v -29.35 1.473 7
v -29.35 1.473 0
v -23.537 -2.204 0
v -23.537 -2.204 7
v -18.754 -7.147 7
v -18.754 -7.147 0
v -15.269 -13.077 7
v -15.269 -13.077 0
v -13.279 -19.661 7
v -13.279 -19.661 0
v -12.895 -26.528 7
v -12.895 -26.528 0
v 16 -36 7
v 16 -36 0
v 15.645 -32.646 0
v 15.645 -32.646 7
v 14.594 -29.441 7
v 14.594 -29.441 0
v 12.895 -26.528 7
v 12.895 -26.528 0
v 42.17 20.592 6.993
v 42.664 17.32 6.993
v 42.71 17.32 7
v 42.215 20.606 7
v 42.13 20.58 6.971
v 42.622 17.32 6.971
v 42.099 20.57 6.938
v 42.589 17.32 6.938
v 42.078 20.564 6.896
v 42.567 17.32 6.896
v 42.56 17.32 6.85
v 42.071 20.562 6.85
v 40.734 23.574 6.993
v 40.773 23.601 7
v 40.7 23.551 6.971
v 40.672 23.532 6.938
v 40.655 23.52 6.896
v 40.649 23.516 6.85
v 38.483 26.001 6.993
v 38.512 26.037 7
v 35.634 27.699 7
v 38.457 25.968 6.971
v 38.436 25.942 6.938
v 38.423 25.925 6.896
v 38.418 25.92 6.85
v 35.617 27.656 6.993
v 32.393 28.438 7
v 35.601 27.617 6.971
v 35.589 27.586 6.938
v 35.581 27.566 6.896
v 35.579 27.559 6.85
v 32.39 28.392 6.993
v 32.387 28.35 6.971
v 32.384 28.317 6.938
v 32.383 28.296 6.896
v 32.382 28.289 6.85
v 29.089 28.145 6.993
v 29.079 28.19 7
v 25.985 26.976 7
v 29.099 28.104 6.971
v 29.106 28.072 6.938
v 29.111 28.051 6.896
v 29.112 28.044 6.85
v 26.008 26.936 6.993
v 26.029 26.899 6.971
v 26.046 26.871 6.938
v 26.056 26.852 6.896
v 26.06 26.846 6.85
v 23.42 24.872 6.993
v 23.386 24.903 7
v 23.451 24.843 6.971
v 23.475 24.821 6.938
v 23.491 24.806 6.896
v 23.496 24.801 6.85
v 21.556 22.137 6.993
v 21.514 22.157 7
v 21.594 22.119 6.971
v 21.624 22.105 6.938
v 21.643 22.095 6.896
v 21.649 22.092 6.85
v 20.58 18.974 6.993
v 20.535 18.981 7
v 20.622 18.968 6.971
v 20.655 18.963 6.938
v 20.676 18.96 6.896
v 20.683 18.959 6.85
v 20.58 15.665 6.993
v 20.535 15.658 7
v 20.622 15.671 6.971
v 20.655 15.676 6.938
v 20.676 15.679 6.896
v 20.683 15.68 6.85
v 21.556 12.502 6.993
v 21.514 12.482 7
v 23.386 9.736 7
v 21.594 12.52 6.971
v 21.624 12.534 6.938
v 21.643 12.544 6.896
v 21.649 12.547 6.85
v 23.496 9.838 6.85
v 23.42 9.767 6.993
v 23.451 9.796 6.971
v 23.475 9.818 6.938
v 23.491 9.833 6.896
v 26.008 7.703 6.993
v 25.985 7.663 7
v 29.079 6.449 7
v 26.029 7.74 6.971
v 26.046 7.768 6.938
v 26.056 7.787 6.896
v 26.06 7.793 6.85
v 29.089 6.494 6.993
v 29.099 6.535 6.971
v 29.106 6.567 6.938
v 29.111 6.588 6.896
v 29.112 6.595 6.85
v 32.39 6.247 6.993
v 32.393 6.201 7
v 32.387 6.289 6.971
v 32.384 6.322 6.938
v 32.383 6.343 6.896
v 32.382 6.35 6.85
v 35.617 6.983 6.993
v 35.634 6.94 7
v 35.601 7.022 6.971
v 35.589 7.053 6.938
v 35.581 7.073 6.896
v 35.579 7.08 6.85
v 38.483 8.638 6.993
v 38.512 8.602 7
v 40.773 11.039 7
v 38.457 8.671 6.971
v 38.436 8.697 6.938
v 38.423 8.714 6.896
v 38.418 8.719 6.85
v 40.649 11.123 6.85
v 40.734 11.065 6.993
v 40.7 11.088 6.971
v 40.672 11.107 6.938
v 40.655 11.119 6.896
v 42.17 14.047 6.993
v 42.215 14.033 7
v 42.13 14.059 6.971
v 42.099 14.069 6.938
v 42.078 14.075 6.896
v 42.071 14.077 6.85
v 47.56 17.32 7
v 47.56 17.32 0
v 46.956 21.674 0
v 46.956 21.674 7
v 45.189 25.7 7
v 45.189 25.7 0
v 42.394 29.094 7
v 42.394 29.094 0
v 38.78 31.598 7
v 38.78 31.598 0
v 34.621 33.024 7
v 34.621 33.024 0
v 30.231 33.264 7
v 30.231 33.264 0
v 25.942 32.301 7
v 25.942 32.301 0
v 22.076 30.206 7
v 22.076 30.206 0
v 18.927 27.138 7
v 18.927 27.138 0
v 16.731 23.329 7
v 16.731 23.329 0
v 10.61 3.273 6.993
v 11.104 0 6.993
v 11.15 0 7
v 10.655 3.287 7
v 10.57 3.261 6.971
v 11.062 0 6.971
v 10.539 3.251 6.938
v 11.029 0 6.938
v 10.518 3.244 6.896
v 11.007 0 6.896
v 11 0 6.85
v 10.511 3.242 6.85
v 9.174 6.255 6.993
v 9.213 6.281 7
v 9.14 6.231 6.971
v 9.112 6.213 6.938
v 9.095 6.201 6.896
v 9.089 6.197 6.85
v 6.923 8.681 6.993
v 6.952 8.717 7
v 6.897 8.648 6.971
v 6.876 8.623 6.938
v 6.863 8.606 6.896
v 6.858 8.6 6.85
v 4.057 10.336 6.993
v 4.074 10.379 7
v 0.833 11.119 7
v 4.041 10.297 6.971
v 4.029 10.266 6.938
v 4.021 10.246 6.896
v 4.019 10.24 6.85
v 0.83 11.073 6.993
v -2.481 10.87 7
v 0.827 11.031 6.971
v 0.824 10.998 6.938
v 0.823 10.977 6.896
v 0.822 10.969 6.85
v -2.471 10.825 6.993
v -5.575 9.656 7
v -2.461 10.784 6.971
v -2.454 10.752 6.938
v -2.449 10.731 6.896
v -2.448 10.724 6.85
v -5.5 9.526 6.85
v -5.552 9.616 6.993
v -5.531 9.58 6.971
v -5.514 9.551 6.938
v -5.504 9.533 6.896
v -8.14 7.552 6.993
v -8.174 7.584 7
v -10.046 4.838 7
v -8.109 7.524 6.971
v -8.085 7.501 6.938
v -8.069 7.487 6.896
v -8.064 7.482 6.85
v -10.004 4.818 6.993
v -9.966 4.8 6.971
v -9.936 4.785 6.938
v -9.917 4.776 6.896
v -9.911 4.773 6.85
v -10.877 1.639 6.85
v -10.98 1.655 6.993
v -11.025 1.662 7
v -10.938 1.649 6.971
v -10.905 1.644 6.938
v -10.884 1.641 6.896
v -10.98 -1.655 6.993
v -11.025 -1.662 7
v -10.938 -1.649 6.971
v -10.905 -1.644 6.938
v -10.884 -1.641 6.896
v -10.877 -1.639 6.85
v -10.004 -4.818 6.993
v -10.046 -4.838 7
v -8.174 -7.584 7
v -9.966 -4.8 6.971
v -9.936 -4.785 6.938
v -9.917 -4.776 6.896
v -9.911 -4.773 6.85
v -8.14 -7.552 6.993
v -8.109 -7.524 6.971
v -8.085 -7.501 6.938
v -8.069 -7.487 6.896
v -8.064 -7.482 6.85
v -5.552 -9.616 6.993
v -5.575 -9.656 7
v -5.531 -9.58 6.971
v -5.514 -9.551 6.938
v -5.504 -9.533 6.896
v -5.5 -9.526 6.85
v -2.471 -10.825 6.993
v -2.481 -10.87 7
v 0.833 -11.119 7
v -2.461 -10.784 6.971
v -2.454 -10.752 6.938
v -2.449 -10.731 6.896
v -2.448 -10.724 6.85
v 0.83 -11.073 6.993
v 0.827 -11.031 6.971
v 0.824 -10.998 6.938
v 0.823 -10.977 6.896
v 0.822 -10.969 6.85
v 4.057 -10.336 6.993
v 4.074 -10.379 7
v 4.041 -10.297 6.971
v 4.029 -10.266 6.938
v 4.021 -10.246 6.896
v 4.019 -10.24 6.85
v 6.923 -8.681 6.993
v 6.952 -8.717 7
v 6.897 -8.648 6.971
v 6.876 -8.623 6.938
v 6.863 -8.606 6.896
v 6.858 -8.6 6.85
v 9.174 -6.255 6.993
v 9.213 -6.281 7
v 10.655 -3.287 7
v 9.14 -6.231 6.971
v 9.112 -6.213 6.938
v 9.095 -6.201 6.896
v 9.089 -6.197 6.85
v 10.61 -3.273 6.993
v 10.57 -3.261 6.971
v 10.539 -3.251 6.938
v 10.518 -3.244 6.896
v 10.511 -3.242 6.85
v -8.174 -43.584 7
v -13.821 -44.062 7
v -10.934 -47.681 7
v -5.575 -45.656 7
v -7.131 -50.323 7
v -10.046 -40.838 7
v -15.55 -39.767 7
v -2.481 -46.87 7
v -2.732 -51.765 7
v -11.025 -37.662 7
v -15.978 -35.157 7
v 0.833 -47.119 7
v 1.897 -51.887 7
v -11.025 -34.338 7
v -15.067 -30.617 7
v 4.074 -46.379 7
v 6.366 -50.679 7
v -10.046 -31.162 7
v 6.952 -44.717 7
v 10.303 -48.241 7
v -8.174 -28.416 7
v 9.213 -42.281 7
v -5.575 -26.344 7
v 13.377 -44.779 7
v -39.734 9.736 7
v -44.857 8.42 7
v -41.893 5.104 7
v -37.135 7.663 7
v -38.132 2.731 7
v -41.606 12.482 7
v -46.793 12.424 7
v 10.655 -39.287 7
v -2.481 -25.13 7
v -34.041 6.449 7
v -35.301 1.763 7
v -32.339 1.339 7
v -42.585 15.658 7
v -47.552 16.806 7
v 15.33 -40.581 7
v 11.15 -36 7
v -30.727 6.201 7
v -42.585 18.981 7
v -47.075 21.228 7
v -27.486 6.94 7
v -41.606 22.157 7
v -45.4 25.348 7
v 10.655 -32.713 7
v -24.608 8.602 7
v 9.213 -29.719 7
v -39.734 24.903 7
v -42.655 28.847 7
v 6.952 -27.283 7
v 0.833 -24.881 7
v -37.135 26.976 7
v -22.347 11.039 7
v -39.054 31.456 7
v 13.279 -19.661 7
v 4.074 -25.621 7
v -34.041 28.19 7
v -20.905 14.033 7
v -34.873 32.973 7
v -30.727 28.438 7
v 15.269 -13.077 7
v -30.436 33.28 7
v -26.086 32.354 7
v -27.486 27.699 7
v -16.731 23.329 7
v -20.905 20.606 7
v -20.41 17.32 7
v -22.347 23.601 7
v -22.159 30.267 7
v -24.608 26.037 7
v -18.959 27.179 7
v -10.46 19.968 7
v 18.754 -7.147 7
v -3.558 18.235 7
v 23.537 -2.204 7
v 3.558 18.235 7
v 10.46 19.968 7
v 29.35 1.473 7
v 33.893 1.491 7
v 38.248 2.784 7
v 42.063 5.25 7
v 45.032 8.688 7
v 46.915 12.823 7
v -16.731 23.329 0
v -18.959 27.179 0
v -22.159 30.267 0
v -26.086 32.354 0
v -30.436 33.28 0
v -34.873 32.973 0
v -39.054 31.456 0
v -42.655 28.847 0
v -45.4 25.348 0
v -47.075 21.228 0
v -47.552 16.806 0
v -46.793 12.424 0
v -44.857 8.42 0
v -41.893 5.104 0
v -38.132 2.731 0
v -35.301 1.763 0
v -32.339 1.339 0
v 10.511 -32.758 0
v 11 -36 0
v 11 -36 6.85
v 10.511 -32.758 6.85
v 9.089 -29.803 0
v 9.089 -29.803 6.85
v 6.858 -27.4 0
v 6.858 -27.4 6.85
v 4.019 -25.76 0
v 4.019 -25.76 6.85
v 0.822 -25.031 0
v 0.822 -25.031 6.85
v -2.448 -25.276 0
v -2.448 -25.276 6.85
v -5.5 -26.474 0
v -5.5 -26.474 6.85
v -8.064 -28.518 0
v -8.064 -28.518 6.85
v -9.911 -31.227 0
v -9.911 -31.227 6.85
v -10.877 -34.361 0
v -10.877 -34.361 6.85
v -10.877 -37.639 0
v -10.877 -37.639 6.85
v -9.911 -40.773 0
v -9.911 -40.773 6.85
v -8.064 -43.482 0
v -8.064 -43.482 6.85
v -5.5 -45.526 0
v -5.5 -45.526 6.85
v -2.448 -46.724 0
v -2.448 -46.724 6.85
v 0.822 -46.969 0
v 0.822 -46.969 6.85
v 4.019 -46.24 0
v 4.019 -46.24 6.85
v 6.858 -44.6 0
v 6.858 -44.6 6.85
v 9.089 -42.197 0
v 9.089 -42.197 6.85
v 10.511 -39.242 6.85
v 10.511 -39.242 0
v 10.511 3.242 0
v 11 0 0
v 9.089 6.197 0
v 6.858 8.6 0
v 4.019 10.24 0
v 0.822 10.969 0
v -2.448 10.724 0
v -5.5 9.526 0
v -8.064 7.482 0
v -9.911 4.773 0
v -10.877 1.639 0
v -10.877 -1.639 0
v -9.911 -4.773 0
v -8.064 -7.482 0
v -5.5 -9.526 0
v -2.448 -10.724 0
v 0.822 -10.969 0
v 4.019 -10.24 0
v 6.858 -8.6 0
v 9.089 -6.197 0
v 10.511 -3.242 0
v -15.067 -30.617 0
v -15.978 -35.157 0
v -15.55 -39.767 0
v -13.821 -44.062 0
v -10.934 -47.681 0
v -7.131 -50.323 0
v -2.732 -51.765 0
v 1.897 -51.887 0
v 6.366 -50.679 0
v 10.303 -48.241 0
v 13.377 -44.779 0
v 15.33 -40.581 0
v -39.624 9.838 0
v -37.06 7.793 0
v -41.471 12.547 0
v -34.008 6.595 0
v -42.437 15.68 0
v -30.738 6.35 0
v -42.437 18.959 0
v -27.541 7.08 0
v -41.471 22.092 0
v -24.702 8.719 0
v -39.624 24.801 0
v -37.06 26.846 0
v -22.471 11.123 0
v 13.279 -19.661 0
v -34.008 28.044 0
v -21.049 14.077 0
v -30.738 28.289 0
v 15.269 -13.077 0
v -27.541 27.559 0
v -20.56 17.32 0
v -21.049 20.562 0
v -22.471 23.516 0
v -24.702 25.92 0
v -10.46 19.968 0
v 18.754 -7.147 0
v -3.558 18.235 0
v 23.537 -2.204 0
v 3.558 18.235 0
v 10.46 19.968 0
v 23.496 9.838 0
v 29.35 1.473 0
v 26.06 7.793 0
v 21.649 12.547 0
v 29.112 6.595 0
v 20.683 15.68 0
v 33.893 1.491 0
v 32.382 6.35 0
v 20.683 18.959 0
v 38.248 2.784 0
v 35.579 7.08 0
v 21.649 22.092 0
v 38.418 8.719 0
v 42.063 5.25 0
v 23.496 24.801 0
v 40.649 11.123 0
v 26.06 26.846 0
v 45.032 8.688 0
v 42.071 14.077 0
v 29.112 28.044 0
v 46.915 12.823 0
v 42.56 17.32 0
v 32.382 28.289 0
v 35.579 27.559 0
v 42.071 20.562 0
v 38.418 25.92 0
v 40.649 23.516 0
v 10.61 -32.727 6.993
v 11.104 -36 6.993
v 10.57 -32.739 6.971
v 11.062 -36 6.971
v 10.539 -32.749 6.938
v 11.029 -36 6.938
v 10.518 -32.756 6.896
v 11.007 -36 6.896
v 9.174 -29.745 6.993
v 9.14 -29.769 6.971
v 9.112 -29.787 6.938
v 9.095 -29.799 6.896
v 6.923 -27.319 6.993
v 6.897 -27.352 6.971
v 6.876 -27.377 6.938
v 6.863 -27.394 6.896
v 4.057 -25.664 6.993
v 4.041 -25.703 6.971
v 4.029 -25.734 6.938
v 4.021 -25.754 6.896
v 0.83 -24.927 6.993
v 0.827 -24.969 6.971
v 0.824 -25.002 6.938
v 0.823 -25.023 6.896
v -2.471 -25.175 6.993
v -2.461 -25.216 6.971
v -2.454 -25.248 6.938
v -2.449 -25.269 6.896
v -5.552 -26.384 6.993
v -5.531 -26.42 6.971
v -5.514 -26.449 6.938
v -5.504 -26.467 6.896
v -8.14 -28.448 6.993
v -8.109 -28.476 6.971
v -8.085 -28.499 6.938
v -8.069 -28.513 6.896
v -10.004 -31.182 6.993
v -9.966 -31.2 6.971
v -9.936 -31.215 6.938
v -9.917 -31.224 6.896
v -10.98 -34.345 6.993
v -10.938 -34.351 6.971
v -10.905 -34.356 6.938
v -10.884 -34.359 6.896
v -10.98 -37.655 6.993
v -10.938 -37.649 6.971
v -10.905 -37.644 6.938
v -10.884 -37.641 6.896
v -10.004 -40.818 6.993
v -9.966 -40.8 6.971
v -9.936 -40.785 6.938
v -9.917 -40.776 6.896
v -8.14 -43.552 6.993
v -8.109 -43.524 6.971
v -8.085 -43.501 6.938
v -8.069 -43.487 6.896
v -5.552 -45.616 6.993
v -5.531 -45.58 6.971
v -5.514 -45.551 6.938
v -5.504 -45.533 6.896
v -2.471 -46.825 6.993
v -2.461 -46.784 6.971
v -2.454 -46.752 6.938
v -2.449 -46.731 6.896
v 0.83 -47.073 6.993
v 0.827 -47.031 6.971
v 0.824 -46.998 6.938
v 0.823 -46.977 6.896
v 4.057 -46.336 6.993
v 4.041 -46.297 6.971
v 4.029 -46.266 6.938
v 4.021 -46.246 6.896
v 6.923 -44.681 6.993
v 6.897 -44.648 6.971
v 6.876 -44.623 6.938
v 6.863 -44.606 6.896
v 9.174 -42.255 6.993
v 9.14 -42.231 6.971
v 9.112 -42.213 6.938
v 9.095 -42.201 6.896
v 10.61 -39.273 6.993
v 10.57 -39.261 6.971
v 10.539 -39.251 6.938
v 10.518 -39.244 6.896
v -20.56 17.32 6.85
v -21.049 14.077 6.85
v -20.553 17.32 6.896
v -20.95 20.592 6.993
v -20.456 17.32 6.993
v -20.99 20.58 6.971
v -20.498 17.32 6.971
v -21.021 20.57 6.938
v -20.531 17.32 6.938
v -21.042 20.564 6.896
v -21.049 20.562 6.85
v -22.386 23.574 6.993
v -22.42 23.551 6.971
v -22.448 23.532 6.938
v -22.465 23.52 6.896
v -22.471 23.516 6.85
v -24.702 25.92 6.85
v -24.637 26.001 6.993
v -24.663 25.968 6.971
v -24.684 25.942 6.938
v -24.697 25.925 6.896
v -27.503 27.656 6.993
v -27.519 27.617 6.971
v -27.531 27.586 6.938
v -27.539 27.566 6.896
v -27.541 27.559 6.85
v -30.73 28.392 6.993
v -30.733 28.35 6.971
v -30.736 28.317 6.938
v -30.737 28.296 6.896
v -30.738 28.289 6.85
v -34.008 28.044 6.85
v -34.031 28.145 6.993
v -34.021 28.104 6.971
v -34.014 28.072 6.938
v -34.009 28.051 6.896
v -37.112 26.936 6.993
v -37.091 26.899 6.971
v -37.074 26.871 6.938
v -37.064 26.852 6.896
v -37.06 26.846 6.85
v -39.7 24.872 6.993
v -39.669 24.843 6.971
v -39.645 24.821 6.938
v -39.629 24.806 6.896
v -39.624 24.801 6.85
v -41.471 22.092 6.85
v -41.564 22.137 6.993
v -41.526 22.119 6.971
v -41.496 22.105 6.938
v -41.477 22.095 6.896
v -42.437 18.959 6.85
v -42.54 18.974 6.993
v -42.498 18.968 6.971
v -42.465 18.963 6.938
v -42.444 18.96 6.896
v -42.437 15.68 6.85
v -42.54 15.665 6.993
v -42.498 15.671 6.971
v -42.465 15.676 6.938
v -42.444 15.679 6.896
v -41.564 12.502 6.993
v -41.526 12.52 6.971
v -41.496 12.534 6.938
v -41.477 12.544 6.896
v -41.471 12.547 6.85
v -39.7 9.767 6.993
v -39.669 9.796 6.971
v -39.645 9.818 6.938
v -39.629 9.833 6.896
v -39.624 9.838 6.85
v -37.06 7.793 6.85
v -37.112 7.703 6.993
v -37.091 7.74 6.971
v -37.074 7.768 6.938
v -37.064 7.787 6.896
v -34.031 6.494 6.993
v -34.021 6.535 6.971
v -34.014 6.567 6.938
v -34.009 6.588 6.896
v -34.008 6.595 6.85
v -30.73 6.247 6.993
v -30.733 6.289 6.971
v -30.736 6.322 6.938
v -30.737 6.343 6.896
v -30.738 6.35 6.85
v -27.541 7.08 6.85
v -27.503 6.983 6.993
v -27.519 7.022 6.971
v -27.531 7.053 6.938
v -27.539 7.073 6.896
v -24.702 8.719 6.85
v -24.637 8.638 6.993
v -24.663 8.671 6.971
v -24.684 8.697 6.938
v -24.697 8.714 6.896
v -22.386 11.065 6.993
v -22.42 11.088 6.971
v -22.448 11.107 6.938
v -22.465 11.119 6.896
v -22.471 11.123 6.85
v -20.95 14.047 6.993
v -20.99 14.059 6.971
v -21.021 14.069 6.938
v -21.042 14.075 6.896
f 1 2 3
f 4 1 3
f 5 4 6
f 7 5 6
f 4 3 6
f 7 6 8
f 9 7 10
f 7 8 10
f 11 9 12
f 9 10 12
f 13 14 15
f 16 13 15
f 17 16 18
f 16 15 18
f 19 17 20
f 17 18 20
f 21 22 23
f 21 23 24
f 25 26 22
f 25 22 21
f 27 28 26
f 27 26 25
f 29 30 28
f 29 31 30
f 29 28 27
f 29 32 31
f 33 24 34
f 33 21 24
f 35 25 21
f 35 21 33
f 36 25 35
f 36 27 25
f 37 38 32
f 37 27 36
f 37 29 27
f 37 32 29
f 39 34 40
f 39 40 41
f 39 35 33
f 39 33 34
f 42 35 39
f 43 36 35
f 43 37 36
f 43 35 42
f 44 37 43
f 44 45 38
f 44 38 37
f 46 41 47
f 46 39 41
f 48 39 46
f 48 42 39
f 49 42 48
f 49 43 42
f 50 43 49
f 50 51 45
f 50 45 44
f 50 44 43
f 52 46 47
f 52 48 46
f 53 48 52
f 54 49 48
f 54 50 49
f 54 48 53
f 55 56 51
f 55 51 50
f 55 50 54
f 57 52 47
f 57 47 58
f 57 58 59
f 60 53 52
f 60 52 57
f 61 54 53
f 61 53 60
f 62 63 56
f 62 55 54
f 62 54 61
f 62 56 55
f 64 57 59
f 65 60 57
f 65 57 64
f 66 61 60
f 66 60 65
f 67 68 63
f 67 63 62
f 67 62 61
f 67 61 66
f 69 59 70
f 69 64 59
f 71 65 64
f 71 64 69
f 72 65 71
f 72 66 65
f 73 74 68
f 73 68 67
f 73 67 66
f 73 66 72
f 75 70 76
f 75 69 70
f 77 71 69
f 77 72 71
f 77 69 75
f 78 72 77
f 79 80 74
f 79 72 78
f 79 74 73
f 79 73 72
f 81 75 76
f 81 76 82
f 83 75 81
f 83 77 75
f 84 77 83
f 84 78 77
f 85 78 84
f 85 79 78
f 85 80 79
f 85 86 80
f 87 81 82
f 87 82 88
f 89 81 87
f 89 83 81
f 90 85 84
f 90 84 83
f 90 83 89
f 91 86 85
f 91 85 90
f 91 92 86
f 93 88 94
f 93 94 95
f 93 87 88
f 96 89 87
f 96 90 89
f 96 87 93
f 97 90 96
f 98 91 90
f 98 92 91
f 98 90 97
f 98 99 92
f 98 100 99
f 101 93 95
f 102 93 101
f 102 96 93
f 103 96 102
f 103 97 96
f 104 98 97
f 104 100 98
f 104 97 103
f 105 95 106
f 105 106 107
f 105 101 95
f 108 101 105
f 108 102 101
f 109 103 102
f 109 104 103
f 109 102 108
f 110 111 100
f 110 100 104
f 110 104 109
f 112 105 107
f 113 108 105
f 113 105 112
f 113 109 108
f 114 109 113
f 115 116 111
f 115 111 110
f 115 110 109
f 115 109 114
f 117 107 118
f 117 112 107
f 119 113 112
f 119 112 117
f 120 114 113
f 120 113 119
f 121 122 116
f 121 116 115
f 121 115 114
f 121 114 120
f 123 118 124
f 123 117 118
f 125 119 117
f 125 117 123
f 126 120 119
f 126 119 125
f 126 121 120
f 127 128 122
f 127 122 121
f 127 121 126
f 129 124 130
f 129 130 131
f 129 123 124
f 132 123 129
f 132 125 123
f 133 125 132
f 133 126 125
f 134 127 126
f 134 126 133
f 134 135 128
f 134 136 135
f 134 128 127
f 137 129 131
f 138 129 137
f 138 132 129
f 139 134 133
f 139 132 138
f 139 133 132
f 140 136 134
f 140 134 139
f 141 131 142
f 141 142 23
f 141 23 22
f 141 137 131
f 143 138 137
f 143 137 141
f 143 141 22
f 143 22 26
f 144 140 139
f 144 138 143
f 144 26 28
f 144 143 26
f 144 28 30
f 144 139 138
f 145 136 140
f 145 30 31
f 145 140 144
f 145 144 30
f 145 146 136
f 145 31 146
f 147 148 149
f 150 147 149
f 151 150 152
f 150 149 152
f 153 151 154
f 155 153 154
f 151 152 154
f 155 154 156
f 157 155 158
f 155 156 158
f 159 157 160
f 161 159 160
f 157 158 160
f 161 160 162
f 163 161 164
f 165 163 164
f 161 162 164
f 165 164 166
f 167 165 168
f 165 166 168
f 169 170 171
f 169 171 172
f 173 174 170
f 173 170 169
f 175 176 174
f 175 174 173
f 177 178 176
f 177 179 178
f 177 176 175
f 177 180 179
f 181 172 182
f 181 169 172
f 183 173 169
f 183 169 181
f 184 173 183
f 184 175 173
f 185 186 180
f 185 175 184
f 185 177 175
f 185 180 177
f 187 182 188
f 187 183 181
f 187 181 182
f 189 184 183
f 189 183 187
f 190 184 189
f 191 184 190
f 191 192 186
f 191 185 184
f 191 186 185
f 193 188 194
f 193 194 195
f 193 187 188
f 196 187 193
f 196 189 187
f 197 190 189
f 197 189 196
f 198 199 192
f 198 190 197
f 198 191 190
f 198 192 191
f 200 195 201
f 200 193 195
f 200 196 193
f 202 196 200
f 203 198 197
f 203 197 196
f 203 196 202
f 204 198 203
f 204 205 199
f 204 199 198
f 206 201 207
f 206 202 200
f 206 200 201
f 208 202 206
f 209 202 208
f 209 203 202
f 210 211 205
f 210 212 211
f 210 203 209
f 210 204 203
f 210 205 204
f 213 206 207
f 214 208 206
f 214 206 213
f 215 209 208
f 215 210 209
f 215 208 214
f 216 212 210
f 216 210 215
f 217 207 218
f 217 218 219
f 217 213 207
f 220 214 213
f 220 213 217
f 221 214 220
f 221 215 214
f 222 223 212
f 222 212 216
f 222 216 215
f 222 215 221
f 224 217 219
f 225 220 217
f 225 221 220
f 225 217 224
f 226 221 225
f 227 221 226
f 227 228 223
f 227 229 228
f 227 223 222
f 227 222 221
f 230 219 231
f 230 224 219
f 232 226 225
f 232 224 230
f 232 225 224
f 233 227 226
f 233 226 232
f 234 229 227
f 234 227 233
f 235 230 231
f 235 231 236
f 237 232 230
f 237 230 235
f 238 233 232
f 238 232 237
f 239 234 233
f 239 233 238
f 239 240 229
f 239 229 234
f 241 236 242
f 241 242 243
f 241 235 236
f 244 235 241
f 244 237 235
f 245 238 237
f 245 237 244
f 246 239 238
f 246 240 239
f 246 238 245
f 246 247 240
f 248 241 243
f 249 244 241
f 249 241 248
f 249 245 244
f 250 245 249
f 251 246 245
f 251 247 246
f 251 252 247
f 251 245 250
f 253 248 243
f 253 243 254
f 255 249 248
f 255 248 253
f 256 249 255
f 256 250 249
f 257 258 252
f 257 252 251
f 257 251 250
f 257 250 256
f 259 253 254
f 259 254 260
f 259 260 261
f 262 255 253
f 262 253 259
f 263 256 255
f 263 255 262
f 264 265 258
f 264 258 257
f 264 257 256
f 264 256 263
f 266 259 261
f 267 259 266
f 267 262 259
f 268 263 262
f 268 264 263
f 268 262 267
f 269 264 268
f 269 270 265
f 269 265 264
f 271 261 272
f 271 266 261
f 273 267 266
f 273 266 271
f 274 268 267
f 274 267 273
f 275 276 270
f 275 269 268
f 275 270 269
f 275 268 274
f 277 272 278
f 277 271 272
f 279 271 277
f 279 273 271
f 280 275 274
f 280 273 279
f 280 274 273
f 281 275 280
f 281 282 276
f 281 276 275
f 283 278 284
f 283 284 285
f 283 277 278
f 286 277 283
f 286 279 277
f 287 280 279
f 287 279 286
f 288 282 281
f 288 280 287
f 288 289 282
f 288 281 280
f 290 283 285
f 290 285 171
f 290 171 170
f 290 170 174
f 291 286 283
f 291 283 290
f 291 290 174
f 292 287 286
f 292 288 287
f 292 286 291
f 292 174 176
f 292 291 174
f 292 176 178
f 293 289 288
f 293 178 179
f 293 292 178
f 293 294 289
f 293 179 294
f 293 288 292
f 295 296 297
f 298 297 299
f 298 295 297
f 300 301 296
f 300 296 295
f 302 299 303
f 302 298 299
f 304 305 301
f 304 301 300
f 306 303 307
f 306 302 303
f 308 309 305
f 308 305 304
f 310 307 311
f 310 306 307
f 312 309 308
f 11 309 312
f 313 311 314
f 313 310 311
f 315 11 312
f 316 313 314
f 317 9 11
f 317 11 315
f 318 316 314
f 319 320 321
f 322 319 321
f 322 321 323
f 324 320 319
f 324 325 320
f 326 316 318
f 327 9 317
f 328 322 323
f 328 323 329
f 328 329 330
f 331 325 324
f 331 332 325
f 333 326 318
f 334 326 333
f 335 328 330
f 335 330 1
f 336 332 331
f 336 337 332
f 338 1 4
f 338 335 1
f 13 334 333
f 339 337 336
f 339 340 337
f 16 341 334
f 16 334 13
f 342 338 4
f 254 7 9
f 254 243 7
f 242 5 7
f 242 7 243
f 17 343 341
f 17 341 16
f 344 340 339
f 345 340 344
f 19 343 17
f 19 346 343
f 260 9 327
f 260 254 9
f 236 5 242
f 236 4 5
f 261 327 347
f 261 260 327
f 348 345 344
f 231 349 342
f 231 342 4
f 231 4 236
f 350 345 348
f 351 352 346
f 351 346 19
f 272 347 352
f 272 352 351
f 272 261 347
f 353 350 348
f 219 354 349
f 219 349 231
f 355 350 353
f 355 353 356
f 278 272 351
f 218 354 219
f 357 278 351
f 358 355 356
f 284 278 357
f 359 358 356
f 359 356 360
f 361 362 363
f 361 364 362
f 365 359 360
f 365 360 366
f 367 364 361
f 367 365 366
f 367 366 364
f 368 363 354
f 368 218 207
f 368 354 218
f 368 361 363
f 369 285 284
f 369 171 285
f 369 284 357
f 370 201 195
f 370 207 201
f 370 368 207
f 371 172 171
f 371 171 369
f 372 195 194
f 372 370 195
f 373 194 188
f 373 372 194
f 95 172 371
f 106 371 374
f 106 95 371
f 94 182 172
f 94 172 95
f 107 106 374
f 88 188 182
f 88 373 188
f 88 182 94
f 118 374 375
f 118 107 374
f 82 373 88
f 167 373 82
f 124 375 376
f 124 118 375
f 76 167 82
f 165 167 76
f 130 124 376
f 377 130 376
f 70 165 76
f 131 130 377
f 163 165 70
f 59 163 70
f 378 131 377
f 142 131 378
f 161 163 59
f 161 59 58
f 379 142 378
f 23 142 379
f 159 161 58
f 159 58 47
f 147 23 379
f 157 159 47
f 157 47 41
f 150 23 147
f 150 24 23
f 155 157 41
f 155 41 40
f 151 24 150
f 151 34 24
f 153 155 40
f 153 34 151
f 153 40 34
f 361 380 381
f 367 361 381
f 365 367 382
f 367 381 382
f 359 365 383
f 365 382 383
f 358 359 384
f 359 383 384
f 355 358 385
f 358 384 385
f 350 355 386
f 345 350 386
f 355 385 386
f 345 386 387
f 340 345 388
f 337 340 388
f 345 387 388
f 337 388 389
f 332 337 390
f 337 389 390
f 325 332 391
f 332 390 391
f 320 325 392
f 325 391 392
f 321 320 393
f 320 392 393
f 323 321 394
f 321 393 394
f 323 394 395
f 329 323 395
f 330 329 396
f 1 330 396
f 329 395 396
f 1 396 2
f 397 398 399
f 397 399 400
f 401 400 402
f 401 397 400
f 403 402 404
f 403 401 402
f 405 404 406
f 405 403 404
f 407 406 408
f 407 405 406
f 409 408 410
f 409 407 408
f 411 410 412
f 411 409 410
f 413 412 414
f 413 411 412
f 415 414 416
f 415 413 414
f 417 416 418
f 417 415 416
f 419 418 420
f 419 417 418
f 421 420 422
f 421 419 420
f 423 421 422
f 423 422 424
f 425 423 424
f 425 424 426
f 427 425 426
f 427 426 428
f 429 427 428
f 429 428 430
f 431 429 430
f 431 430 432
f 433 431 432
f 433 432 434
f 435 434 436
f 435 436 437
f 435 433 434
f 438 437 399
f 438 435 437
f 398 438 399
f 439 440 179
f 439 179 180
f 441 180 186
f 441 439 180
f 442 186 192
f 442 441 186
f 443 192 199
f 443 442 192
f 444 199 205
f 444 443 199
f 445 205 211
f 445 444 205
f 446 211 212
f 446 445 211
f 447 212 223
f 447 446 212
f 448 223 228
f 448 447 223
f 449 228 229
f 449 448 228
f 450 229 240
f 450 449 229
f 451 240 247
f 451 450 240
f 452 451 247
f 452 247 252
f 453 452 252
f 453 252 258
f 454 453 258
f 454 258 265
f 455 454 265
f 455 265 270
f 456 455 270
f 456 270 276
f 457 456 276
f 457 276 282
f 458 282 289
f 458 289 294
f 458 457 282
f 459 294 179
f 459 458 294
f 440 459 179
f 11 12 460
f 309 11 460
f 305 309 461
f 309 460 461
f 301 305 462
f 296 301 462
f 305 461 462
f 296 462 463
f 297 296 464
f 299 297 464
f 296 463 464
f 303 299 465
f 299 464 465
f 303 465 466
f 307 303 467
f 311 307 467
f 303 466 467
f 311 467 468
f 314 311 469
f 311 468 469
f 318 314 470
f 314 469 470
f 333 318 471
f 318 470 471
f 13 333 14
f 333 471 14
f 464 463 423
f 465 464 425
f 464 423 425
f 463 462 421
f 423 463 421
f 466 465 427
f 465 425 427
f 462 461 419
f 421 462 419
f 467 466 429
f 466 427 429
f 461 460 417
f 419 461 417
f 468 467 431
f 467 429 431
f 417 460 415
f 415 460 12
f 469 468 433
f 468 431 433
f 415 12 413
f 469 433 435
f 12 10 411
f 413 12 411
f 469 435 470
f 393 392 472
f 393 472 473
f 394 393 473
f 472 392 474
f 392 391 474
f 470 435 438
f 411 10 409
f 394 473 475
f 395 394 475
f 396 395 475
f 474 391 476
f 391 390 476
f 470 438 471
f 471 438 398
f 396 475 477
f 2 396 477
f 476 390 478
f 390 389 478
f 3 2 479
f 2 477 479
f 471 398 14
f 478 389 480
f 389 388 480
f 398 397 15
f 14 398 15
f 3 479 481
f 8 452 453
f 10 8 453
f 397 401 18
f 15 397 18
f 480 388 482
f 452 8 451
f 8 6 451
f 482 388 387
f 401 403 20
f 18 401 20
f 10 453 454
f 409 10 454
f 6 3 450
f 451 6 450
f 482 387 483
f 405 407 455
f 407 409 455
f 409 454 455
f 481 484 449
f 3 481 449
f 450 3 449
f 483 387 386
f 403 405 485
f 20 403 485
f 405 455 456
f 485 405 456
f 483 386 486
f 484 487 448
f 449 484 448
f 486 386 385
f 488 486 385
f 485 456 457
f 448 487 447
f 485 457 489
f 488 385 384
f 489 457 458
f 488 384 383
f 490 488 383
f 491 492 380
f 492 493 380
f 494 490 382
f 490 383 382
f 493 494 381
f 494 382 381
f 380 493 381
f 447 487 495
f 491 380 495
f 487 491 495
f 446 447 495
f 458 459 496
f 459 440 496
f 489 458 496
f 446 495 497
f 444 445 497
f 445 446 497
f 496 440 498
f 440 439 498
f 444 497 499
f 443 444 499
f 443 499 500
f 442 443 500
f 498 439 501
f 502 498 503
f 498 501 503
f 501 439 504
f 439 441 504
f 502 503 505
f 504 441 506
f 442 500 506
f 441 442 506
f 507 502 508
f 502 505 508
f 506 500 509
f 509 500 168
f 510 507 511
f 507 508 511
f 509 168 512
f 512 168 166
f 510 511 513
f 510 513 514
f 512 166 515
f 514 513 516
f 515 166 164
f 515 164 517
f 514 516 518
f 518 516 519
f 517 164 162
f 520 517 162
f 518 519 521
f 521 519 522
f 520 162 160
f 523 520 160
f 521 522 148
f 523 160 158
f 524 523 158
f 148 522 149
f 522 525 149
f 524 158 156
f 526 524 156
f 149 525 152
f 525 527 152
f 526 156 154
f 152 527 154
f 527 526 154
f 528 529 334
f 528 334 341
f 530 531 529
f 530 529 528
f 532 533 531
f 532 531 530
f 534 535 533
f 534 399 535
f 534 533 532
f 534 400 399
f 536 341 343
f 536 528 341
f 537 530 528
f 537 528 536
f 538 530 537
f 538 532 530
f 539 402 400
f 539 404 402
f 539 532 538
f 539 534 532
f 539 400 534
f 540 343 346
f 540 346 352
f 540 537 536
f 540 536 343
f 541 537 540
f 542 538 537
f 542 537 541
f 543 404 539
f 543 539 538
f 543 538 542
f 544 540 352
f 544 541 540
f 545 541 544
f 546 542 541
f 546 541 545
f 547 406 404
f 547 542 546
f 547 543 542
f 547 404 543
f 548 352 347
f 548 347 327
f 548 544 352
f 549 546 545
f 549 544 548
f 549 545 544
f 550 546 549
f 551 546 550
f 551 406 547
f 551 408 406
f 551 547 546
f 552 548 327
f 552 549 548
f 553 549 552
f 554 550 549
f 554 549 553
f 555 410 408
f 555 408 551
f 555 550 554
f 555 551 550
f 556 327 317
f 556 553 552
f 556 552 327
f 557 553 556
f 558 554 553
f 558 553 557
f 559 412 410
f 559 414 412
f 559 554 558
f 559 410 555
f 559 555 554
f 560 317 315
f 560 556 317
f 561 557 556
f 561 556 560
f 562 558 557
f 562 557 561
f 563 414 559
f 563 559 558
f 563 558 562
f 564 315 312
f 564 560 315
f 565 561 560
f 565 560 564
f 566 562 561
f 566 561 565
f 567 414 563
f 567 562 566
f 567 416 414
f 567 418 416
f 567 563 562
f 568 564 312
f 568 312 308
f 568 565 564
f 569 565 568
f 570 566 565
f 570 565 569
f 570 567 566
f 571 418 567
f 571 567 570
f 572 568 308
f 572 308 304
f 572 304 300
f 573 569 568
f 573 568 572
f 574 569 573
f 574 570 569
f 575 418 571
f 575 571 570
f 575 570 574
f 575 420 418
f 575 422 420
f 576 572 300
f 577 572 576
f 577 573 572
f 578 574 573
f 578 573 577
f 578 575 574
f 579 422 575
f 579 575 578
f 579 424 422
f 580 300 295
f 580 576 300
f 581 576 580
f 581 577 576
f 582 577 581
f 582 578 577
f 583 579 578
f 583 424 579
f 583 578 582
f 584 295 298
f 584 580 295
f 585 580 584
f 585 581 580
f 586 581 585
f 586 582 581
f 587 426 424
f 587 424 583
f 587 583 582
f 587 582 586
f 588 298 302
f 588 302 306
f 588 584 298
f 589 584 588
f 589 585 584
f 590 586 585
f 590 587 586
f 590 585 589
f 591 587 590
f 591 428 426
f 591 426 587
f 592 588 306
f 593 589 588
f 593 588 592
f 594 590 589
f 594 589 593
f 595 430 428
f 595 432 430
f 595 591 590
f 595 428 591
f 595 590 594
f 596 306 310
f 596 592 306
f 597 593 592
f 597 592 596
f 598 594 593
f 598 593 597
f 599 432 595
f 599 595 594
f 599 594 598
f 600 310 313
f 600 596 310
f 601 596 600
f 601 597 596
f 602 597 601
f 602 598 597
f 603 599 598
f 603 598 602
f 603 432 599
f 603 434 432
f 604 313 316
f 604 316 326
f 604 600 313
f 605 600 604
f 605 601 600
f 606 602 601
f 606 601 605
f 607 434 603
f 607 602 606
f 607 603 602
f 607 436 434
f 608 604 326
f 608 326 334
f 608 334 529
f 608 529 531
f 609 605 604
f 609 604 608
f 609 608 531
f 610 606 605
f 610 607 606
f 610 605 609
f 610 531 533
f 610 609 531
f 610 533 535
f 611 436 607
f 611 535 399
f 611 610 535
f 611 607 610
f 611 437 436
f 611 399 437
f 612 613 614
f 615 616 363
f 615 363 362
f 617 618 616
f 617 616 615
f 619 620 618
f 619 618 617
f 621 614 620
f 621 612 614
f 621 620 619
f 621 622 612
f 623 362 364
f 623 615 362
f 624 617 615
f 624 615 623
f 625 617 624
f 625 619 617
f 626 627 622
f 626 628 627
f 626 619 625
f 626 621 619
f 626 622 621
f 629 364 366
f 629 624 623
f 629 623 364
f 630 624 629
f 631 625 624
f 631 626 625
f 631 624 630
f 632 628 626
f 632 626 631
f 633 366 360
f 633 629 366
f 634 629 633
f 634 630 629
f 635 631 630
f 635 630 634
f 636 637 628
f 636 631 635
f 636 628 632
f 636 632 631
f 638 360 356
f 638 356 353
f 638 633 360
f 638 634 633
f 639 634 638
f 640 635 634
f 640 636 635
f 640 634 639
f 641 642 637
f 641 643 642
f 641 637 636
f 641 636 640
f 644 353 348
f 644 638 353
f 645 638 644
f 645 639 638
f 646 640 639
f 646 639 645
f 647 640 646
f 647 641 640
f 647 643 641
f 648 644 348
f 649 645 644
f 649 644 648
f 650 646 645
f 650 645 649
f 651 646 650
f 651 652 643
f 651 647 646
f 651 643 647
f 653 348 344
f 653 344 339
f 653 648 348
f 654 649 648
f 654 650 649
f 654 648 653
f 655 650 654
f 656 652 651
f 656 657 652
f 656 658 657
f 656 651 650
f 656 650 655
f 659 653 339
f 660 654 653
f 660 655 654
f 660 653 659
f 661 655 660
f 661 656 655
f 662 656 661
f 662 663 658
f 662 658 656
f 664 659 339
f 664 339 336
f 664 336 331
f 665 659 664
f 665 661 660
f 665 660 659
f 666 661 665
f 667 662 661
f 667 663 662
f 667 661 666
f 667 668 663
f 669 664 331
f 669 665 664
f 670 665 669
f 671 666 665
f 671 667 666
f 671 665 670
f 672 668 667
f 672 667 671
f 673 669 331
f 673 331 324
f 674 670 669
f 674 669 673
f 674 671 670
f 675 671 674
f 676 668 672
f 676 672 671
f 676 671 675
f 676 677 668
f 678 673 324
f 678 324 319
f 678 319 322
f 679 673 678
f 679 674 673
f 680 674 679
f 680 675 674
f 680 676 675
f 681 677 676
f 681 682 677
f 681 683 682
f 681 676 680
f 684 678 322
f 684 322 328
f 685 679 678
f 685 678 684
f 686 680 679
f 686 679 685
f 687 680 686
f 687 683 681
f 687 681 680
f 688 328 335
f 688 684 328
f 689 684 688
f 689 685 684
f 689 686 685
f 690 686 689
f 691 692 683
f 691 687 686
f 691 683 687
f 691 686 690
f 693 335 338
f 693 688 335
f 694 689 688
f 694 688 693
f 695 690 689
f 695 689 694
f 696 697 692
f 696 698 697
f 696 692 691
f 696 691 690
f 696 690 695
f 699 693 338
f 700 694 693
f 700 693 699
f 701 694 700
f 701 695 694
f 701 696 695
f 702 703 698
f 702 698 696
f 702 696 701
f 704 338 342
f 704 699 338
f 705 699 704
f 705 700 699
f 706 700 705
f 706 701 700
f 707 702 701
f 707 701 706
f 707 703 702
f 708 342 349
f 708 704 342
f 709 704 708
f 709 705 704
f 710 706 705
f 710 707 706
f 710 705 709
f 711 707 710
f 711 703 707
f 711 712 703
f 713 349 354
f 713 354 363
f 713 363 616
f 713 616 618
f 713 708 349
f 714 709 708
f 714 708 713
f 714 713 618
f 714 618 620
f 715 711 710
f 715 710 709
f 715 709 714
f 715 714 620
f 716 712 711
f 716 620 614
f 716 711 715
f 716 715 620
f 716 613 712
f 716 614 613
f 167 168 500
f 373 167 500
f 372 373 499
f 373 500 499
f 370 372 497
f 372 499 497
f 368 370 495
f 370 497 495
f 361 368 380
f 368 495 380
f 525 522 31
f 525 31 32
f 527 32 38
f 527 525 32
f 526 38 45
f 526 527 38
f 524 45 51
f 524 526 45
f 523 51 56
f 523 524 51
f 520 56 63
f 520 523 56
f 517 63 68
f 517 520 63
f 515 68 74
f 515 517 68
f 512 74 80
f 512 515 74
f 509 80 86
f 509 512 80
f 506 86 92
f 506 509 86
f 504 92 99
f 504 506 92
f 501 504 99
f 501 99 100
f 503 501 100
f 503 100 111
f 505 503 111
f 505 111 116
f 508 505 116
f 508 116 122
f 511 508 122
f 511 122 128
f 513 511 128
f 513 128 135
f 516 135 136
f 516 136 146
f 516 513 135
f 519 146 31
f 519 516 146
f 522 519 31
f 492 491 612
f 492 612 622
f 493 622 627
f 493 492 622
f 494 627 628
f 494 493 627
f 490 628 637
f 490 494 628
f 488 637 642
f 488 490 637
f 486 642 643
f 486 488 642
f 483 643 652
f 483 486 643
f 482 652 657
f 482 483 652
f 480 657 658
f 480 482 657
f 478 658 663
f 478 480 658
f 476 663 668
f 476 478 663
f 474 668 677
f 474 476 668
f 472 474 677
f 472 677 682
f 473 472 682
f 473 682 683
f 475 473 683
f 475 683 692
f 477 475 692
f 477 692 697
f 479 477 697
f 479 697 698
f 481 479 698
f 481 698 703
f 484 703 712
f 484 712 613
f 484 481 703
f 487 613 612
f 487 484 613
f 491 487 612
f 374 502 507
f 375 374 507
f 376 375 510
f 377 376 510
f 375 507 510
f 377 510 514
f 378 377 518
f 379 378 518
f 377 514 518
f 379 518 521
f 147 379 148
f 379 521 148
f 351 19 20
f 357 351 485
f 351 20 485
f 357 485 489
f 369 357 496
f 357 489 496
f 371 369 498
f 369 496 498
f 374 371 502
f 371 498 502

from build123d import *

# Parameters (mm, degrees)
F0_R     = 11
F1_DEPTH = 7
F2_DEPTH = 7
F3_R     = 0.15
F4_R     = 0.15
F5_R     = 0.15


# Not quite as in the source:
# - a feature names something its author has since deleted; it is built from what else it names


with BuildPart() as f1:
    # F0 (on Top) → F1 (new body)
    with BuildSketch(Plane.XY):
        with BuildLine():
            ThreePointArc((29.3501442774, 1.4728811124), (17.7035935394, 9.3195381001), (16.7314646223, 23.3290753994))
            ThreePointArc((16.7314646223, 23.3290753994), (0, 18.0157402468), (-16.7314646223, 23.3290753994))
            ThreePointArc((-16.7314646223, 23.3290753994), (-15.8555966996, 20.3808641164), (-15.56, 17.3195381001))
            ThreePointArc((-15.56, 17.3195381001), (-19.4902507988, 6.8161503505), (-29.3501442774, 1.4728811124))
            ThreePointArc((-29.3501442774, 1.4728811124), (-16.8351135056, -10.0081099666), (-12.8952216464, -26.5282916699))
            ThreePointArc((-12.8952216464, -26.5282916699), (-0.0001071921, -20.0000000004), (12.8950947338, -26.5281188876))
            ThreePointArc((12.8950947338, -26.5281188876), (16.8350899961, -10.0080120701), (29.3501442774, 1.4728811124))
        make_face()
        Circle(F0_R, mode=Mode.SUBTRACT)
    extrude(amount=F1_DEPTH)

    # F0 (on Top) → F2 (join)
    with BuildSketch(Plane.XY):
        with BuildLine():
            ThreePointArc((29.3501442774, 1.4728811124), (42.0633877496, 5.2497888988), (47.56, 17.3195381001))
            ThreePointArc((47.56, 17.3195381001), (34.6213260163, 33.0239414005), (16.7314646223, 23.3290753994))
            ThreePointArc((16.7314646223, 23.3290753994), (17.7035935394, 9.3195381001), (29.3501442774, 1.4728811124))
        make_face()
        with Locations((31.56, 17.3195381001)):
            Circle(F0_R, mode=Mode.SUBTRACT)
        with BuildLine():
            ThreePointArc((-15.56, 17.3195381001), (-15.8555966996, 20.3808641164), (-16.7314646223, 23.3290753994))
            ThreePointArc((-16.7314646223, 23.3290753994), (-42.6554805123, 28.8473441446), (-38.1316823001, 2.7314267848))
            ThreePointArc((-38.1316823001, 2.7314267848), (-33.8298826127, 1.4813679746), (-29.3501442774, 1.4728811124))
            ThreePointArc((-29.3501442774, 1.4728811124), (-19.4902507988, 6.8161503505), (-15.56, 17.3195381001))
        make_face()
        with Locations((-31.56, 17.3195381001)):
            Circle(F0_R, mode=Mode.SUBTRACT)
        with BuildLine():
            ThreePointArc((16, -36), (15.2039717794, -31.0161017135), (12.8950947338, -26.5281188876))
            ThreePointArc((12.8950947338, -26.5281188876), (-0.0001071921, -20.0000000004), (-12.8952216464, -26.5282916699))
            ThreePointArc((-12.8952216464, -26.5282916699), (-4.9837964273, -51.2040051687), (16, -36))
        make_face()
        with Locations((0, -36)):
            Circle(F0_R, mode=Mode.SUBTRACT)
    extrude(amount=F2_DEPTH)

    # F3
    f3_edges = [f1.edges().sort_by_distance(p)[0] for p in [
        (-11, 0, 7),
    ]]
    fillet(f3_edges, radius=F3_R)

    # F4
    f4_edges = [f1.edges().sort_by_distance(p)[0] for p in [
        (-42.56, 17.319538, 7),
        (-11, -36, 7),
    ]]
    fillet(f4_edges, radius=F4_R)

    # F5
    f5_edges = [f1.edges().sort_by_distance(p)[0] for p in [
        (20.56, 17.319538, 7),
    ]]
    fillet(f5_edges, radius=F5_R)


solid = f1.part
